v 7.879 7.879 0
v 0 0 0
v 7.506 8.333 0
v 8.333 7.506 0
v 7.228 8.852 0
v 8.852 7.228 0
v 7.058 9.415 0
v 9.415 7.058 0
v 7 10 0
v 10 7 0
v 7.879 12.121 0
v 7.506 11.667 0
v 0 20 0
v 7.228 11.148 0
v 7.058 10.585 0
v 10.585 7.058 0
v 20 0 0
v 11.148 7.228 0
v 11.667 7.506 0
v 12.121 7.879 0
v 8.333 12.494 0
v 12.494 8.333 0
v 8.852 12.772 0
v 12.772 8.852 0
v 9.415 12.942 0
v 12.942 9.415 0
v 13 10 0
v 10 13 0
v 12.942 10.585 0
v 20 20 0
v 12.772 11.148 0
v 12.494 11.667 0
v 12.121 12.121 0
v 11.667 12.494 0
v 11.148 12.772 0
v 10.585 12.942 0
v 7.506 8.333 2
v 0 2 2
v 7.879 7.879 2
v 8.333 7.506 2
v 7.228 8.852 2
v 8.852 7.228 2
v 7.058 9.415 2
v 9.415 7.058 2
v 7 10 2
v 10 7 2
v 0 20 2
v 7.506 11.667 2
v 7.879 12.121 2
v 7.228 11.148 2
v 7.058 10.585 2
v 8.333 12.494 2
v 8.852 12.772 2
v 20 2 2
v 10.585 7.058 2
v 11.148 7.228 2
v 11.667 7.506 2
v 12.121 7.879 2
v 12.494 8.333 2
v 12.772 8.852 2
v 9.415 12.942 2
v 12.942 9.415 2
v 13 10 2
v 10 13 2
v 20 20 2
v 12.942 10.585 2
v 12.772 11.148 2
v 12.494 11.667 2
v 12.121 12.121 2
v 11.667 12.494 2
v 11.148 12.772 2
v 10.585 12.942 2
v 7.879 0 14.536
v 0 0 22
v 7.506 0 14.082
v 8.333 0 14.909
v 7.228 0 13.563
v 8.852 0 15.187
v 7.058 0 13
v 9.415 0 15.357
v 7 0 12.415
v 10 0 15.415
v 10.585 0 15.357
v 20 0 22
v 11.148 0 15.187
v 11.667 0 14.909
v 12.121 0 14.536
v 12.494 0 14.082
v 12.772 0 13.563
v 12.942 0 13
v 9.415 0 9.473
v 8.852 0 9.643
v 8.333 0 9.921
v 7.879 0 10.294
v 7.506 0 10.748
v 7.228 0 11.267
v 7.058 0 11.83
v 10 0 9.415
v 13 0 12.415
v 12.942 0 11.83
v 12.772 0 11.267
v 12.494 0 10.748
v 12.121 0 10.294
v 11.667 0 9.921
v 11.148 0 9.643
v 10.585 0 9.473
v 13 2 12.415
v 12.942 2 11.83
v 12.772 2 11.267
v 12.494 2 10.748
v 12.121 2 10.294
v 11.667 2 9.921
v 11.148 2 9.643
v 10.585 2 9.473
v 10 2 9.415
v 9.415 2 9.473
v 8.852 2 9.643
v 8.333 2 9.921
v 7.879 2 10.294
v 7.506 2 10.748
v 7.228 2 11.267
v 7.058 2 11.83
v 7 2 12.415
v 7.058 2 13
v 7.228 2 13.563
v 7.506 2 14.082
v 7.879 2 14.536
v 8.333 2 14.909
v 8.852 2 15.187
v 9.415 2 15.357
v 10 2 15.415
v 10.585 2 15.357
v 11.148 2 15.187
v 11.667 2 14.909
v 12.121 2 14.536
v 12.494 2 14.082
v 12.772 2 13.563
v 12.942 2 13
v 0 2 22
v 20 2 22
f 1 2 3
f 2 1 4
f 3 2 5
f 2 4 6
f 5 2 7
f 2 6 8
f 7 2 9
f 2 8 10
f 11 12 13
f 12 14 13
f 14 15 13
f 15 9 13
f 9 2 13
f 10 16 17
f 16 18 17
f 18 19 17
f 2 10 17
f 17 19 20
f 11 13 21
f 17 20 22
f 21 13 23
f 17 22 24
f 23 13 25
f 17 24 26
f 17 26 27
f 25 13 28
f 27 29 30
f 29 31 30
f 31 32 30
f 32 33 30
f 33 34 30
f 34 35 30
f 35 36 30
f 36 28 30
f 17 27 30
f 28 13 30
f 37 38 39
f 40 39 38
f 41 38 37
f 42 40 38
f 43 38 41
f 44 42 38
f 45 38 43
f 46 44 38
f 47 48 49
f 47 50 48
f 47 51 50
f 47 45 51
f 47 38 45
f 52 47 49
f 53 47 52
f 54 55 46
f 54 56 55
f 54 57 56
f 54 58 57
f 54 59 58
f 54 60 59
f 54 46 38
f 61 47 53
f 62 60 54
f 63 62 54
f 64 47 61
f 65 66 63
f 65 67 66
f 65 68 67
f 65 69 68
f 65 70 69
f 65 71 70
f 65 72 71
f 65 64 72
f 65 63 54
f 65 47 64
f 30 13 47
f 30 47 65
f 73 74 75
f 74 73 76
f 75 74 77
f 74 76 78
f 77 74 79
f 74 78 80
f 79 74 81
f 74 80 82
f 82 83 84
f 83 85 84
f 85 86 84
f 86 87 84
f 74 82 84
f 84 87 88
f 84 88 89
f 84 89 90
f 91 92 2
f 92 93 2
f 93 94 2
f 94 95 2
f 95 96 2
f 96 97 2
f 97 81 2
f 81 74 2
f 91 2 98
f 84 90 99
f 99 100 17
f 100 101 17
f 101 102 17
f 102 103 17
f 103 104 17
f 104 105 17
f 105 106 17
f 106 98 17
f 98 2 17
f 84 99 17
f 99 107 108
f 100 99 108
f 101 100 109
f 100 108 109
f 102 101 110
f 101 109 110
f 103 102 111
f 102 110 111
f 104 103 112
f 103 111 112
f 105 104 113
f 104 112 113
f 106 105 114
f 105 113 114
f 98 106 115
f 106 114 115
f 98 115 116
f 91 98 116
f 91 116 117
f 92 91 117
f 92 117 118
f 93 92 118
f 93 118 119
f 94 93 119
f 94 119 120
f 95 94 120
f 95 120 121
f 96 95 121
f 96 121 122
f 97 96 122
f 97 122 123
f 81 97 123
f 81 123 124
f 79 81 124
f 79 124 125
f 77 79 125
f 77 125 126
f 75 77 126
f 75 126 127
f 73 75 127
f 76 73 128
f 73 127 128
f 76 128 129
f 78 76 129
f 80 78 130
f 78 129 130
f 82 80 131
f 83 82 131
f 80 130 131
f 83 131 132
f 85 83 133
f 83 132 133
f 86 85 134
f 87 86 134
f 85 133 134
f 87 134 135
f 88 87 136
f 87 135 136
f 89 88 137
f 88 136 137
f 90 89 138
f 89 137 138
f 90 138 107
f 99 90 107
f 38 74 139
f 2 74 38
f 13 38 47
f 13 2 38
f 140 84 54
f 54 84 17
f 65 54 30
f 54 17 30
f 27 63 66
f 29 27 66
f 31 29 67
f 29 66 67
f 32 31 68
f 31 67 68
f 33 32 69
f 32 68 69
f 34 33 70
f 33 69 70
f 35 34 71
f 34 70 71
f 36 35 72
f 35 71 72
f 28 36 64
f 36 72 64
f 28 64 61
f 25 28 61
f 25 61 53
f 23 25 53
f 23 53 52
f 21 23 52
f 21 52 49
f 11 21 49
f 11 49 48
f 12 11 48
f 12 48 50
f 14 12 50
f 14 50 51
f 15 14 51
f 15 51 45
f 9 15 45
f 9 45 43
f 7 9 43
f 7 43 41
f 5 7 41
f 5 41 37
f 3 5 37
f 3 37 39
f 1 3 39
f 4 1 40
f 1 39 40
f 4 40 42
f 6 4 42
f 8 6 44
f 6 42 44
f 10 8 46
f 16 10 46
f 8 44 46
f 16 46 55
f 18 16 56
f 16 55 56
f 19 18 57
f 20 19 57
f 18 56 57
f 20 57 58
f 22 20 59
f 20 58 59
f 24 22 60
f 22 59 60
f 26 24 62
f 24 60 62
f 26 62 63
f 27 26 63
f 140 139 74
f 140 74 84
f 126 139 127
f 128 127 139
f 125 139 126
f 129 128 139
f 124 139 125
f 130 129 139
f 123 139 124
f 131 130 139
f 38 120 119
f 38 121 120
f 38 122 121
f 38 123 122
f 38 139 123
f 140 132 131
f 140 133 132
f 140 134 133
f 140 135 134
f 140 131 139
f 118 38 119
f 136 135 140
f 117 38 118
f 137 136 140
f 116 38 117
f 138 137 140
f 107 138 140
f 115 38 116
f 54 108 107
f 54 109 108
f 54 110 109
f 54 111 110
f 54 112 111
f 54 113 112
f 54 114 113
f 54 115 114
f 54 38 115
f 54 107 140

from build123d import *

# Parameters (mm, degrees)
SKETCH2_W           = 20
SKETCH2_H           = 20
BOSS_EXTRUDE1_DEPTH = 2
SKETCH3_W           = 20
SKETCH3_H           = 2
BOSS_EXTRUDE2_DEPTH = 20
SKETCH4_R           = 3
CUT_EXTRUDE1_DEPTH  = 10
SKETCH5_R           = 3
CUT_EXTRUDE2_DEPTH  = 10


with BuildPart() as part:
    # Sketch2 → Boss-Extrude1 (new body)
    with BuildSketch(Plane.XY):
        with Locations((10, 10)):
            Rectangle(SKETCH2_W, SKETCH2_H)
    extrude(amount=BOSS_EXTRUDE1_DEPTH)

    # Sketch3 → Boss-Extrude2 (add)
    with BuildSketch(Plane.XY.offset(2)):
        with Locations((10, 1)):
            Rectangle(SKETCH3_W, SKETCH3_H)
    extrude(amount=BOSS_EXTRUDE2_DEPTH)

    # Sketch4 → Cut-Extrude1 (cut)
    with BuildSketch(Plane(origin=(0, 2, 0), x_dir=(1, 0, 0), z_dir=(0, 1, 0))):
        with Locations((10, -12.415090131)):
            Circle(SKETCH4_R)
    extrude(amount=-CUT_EXTRUDE1_DEPTH, mode=Mode.SUBTRACT)

    # Sketch5 → Cut-Extrude2 (cut)
    with BuildSketch(Plane.XY.offset(2)):
        with Locations((10, 10)):
            Circle(SKETCH5_R)
    extrude(amount=-CUT_EXTRUDE2_DEPTH, mode=Mode.SUBTRACT)


solid = part.part
